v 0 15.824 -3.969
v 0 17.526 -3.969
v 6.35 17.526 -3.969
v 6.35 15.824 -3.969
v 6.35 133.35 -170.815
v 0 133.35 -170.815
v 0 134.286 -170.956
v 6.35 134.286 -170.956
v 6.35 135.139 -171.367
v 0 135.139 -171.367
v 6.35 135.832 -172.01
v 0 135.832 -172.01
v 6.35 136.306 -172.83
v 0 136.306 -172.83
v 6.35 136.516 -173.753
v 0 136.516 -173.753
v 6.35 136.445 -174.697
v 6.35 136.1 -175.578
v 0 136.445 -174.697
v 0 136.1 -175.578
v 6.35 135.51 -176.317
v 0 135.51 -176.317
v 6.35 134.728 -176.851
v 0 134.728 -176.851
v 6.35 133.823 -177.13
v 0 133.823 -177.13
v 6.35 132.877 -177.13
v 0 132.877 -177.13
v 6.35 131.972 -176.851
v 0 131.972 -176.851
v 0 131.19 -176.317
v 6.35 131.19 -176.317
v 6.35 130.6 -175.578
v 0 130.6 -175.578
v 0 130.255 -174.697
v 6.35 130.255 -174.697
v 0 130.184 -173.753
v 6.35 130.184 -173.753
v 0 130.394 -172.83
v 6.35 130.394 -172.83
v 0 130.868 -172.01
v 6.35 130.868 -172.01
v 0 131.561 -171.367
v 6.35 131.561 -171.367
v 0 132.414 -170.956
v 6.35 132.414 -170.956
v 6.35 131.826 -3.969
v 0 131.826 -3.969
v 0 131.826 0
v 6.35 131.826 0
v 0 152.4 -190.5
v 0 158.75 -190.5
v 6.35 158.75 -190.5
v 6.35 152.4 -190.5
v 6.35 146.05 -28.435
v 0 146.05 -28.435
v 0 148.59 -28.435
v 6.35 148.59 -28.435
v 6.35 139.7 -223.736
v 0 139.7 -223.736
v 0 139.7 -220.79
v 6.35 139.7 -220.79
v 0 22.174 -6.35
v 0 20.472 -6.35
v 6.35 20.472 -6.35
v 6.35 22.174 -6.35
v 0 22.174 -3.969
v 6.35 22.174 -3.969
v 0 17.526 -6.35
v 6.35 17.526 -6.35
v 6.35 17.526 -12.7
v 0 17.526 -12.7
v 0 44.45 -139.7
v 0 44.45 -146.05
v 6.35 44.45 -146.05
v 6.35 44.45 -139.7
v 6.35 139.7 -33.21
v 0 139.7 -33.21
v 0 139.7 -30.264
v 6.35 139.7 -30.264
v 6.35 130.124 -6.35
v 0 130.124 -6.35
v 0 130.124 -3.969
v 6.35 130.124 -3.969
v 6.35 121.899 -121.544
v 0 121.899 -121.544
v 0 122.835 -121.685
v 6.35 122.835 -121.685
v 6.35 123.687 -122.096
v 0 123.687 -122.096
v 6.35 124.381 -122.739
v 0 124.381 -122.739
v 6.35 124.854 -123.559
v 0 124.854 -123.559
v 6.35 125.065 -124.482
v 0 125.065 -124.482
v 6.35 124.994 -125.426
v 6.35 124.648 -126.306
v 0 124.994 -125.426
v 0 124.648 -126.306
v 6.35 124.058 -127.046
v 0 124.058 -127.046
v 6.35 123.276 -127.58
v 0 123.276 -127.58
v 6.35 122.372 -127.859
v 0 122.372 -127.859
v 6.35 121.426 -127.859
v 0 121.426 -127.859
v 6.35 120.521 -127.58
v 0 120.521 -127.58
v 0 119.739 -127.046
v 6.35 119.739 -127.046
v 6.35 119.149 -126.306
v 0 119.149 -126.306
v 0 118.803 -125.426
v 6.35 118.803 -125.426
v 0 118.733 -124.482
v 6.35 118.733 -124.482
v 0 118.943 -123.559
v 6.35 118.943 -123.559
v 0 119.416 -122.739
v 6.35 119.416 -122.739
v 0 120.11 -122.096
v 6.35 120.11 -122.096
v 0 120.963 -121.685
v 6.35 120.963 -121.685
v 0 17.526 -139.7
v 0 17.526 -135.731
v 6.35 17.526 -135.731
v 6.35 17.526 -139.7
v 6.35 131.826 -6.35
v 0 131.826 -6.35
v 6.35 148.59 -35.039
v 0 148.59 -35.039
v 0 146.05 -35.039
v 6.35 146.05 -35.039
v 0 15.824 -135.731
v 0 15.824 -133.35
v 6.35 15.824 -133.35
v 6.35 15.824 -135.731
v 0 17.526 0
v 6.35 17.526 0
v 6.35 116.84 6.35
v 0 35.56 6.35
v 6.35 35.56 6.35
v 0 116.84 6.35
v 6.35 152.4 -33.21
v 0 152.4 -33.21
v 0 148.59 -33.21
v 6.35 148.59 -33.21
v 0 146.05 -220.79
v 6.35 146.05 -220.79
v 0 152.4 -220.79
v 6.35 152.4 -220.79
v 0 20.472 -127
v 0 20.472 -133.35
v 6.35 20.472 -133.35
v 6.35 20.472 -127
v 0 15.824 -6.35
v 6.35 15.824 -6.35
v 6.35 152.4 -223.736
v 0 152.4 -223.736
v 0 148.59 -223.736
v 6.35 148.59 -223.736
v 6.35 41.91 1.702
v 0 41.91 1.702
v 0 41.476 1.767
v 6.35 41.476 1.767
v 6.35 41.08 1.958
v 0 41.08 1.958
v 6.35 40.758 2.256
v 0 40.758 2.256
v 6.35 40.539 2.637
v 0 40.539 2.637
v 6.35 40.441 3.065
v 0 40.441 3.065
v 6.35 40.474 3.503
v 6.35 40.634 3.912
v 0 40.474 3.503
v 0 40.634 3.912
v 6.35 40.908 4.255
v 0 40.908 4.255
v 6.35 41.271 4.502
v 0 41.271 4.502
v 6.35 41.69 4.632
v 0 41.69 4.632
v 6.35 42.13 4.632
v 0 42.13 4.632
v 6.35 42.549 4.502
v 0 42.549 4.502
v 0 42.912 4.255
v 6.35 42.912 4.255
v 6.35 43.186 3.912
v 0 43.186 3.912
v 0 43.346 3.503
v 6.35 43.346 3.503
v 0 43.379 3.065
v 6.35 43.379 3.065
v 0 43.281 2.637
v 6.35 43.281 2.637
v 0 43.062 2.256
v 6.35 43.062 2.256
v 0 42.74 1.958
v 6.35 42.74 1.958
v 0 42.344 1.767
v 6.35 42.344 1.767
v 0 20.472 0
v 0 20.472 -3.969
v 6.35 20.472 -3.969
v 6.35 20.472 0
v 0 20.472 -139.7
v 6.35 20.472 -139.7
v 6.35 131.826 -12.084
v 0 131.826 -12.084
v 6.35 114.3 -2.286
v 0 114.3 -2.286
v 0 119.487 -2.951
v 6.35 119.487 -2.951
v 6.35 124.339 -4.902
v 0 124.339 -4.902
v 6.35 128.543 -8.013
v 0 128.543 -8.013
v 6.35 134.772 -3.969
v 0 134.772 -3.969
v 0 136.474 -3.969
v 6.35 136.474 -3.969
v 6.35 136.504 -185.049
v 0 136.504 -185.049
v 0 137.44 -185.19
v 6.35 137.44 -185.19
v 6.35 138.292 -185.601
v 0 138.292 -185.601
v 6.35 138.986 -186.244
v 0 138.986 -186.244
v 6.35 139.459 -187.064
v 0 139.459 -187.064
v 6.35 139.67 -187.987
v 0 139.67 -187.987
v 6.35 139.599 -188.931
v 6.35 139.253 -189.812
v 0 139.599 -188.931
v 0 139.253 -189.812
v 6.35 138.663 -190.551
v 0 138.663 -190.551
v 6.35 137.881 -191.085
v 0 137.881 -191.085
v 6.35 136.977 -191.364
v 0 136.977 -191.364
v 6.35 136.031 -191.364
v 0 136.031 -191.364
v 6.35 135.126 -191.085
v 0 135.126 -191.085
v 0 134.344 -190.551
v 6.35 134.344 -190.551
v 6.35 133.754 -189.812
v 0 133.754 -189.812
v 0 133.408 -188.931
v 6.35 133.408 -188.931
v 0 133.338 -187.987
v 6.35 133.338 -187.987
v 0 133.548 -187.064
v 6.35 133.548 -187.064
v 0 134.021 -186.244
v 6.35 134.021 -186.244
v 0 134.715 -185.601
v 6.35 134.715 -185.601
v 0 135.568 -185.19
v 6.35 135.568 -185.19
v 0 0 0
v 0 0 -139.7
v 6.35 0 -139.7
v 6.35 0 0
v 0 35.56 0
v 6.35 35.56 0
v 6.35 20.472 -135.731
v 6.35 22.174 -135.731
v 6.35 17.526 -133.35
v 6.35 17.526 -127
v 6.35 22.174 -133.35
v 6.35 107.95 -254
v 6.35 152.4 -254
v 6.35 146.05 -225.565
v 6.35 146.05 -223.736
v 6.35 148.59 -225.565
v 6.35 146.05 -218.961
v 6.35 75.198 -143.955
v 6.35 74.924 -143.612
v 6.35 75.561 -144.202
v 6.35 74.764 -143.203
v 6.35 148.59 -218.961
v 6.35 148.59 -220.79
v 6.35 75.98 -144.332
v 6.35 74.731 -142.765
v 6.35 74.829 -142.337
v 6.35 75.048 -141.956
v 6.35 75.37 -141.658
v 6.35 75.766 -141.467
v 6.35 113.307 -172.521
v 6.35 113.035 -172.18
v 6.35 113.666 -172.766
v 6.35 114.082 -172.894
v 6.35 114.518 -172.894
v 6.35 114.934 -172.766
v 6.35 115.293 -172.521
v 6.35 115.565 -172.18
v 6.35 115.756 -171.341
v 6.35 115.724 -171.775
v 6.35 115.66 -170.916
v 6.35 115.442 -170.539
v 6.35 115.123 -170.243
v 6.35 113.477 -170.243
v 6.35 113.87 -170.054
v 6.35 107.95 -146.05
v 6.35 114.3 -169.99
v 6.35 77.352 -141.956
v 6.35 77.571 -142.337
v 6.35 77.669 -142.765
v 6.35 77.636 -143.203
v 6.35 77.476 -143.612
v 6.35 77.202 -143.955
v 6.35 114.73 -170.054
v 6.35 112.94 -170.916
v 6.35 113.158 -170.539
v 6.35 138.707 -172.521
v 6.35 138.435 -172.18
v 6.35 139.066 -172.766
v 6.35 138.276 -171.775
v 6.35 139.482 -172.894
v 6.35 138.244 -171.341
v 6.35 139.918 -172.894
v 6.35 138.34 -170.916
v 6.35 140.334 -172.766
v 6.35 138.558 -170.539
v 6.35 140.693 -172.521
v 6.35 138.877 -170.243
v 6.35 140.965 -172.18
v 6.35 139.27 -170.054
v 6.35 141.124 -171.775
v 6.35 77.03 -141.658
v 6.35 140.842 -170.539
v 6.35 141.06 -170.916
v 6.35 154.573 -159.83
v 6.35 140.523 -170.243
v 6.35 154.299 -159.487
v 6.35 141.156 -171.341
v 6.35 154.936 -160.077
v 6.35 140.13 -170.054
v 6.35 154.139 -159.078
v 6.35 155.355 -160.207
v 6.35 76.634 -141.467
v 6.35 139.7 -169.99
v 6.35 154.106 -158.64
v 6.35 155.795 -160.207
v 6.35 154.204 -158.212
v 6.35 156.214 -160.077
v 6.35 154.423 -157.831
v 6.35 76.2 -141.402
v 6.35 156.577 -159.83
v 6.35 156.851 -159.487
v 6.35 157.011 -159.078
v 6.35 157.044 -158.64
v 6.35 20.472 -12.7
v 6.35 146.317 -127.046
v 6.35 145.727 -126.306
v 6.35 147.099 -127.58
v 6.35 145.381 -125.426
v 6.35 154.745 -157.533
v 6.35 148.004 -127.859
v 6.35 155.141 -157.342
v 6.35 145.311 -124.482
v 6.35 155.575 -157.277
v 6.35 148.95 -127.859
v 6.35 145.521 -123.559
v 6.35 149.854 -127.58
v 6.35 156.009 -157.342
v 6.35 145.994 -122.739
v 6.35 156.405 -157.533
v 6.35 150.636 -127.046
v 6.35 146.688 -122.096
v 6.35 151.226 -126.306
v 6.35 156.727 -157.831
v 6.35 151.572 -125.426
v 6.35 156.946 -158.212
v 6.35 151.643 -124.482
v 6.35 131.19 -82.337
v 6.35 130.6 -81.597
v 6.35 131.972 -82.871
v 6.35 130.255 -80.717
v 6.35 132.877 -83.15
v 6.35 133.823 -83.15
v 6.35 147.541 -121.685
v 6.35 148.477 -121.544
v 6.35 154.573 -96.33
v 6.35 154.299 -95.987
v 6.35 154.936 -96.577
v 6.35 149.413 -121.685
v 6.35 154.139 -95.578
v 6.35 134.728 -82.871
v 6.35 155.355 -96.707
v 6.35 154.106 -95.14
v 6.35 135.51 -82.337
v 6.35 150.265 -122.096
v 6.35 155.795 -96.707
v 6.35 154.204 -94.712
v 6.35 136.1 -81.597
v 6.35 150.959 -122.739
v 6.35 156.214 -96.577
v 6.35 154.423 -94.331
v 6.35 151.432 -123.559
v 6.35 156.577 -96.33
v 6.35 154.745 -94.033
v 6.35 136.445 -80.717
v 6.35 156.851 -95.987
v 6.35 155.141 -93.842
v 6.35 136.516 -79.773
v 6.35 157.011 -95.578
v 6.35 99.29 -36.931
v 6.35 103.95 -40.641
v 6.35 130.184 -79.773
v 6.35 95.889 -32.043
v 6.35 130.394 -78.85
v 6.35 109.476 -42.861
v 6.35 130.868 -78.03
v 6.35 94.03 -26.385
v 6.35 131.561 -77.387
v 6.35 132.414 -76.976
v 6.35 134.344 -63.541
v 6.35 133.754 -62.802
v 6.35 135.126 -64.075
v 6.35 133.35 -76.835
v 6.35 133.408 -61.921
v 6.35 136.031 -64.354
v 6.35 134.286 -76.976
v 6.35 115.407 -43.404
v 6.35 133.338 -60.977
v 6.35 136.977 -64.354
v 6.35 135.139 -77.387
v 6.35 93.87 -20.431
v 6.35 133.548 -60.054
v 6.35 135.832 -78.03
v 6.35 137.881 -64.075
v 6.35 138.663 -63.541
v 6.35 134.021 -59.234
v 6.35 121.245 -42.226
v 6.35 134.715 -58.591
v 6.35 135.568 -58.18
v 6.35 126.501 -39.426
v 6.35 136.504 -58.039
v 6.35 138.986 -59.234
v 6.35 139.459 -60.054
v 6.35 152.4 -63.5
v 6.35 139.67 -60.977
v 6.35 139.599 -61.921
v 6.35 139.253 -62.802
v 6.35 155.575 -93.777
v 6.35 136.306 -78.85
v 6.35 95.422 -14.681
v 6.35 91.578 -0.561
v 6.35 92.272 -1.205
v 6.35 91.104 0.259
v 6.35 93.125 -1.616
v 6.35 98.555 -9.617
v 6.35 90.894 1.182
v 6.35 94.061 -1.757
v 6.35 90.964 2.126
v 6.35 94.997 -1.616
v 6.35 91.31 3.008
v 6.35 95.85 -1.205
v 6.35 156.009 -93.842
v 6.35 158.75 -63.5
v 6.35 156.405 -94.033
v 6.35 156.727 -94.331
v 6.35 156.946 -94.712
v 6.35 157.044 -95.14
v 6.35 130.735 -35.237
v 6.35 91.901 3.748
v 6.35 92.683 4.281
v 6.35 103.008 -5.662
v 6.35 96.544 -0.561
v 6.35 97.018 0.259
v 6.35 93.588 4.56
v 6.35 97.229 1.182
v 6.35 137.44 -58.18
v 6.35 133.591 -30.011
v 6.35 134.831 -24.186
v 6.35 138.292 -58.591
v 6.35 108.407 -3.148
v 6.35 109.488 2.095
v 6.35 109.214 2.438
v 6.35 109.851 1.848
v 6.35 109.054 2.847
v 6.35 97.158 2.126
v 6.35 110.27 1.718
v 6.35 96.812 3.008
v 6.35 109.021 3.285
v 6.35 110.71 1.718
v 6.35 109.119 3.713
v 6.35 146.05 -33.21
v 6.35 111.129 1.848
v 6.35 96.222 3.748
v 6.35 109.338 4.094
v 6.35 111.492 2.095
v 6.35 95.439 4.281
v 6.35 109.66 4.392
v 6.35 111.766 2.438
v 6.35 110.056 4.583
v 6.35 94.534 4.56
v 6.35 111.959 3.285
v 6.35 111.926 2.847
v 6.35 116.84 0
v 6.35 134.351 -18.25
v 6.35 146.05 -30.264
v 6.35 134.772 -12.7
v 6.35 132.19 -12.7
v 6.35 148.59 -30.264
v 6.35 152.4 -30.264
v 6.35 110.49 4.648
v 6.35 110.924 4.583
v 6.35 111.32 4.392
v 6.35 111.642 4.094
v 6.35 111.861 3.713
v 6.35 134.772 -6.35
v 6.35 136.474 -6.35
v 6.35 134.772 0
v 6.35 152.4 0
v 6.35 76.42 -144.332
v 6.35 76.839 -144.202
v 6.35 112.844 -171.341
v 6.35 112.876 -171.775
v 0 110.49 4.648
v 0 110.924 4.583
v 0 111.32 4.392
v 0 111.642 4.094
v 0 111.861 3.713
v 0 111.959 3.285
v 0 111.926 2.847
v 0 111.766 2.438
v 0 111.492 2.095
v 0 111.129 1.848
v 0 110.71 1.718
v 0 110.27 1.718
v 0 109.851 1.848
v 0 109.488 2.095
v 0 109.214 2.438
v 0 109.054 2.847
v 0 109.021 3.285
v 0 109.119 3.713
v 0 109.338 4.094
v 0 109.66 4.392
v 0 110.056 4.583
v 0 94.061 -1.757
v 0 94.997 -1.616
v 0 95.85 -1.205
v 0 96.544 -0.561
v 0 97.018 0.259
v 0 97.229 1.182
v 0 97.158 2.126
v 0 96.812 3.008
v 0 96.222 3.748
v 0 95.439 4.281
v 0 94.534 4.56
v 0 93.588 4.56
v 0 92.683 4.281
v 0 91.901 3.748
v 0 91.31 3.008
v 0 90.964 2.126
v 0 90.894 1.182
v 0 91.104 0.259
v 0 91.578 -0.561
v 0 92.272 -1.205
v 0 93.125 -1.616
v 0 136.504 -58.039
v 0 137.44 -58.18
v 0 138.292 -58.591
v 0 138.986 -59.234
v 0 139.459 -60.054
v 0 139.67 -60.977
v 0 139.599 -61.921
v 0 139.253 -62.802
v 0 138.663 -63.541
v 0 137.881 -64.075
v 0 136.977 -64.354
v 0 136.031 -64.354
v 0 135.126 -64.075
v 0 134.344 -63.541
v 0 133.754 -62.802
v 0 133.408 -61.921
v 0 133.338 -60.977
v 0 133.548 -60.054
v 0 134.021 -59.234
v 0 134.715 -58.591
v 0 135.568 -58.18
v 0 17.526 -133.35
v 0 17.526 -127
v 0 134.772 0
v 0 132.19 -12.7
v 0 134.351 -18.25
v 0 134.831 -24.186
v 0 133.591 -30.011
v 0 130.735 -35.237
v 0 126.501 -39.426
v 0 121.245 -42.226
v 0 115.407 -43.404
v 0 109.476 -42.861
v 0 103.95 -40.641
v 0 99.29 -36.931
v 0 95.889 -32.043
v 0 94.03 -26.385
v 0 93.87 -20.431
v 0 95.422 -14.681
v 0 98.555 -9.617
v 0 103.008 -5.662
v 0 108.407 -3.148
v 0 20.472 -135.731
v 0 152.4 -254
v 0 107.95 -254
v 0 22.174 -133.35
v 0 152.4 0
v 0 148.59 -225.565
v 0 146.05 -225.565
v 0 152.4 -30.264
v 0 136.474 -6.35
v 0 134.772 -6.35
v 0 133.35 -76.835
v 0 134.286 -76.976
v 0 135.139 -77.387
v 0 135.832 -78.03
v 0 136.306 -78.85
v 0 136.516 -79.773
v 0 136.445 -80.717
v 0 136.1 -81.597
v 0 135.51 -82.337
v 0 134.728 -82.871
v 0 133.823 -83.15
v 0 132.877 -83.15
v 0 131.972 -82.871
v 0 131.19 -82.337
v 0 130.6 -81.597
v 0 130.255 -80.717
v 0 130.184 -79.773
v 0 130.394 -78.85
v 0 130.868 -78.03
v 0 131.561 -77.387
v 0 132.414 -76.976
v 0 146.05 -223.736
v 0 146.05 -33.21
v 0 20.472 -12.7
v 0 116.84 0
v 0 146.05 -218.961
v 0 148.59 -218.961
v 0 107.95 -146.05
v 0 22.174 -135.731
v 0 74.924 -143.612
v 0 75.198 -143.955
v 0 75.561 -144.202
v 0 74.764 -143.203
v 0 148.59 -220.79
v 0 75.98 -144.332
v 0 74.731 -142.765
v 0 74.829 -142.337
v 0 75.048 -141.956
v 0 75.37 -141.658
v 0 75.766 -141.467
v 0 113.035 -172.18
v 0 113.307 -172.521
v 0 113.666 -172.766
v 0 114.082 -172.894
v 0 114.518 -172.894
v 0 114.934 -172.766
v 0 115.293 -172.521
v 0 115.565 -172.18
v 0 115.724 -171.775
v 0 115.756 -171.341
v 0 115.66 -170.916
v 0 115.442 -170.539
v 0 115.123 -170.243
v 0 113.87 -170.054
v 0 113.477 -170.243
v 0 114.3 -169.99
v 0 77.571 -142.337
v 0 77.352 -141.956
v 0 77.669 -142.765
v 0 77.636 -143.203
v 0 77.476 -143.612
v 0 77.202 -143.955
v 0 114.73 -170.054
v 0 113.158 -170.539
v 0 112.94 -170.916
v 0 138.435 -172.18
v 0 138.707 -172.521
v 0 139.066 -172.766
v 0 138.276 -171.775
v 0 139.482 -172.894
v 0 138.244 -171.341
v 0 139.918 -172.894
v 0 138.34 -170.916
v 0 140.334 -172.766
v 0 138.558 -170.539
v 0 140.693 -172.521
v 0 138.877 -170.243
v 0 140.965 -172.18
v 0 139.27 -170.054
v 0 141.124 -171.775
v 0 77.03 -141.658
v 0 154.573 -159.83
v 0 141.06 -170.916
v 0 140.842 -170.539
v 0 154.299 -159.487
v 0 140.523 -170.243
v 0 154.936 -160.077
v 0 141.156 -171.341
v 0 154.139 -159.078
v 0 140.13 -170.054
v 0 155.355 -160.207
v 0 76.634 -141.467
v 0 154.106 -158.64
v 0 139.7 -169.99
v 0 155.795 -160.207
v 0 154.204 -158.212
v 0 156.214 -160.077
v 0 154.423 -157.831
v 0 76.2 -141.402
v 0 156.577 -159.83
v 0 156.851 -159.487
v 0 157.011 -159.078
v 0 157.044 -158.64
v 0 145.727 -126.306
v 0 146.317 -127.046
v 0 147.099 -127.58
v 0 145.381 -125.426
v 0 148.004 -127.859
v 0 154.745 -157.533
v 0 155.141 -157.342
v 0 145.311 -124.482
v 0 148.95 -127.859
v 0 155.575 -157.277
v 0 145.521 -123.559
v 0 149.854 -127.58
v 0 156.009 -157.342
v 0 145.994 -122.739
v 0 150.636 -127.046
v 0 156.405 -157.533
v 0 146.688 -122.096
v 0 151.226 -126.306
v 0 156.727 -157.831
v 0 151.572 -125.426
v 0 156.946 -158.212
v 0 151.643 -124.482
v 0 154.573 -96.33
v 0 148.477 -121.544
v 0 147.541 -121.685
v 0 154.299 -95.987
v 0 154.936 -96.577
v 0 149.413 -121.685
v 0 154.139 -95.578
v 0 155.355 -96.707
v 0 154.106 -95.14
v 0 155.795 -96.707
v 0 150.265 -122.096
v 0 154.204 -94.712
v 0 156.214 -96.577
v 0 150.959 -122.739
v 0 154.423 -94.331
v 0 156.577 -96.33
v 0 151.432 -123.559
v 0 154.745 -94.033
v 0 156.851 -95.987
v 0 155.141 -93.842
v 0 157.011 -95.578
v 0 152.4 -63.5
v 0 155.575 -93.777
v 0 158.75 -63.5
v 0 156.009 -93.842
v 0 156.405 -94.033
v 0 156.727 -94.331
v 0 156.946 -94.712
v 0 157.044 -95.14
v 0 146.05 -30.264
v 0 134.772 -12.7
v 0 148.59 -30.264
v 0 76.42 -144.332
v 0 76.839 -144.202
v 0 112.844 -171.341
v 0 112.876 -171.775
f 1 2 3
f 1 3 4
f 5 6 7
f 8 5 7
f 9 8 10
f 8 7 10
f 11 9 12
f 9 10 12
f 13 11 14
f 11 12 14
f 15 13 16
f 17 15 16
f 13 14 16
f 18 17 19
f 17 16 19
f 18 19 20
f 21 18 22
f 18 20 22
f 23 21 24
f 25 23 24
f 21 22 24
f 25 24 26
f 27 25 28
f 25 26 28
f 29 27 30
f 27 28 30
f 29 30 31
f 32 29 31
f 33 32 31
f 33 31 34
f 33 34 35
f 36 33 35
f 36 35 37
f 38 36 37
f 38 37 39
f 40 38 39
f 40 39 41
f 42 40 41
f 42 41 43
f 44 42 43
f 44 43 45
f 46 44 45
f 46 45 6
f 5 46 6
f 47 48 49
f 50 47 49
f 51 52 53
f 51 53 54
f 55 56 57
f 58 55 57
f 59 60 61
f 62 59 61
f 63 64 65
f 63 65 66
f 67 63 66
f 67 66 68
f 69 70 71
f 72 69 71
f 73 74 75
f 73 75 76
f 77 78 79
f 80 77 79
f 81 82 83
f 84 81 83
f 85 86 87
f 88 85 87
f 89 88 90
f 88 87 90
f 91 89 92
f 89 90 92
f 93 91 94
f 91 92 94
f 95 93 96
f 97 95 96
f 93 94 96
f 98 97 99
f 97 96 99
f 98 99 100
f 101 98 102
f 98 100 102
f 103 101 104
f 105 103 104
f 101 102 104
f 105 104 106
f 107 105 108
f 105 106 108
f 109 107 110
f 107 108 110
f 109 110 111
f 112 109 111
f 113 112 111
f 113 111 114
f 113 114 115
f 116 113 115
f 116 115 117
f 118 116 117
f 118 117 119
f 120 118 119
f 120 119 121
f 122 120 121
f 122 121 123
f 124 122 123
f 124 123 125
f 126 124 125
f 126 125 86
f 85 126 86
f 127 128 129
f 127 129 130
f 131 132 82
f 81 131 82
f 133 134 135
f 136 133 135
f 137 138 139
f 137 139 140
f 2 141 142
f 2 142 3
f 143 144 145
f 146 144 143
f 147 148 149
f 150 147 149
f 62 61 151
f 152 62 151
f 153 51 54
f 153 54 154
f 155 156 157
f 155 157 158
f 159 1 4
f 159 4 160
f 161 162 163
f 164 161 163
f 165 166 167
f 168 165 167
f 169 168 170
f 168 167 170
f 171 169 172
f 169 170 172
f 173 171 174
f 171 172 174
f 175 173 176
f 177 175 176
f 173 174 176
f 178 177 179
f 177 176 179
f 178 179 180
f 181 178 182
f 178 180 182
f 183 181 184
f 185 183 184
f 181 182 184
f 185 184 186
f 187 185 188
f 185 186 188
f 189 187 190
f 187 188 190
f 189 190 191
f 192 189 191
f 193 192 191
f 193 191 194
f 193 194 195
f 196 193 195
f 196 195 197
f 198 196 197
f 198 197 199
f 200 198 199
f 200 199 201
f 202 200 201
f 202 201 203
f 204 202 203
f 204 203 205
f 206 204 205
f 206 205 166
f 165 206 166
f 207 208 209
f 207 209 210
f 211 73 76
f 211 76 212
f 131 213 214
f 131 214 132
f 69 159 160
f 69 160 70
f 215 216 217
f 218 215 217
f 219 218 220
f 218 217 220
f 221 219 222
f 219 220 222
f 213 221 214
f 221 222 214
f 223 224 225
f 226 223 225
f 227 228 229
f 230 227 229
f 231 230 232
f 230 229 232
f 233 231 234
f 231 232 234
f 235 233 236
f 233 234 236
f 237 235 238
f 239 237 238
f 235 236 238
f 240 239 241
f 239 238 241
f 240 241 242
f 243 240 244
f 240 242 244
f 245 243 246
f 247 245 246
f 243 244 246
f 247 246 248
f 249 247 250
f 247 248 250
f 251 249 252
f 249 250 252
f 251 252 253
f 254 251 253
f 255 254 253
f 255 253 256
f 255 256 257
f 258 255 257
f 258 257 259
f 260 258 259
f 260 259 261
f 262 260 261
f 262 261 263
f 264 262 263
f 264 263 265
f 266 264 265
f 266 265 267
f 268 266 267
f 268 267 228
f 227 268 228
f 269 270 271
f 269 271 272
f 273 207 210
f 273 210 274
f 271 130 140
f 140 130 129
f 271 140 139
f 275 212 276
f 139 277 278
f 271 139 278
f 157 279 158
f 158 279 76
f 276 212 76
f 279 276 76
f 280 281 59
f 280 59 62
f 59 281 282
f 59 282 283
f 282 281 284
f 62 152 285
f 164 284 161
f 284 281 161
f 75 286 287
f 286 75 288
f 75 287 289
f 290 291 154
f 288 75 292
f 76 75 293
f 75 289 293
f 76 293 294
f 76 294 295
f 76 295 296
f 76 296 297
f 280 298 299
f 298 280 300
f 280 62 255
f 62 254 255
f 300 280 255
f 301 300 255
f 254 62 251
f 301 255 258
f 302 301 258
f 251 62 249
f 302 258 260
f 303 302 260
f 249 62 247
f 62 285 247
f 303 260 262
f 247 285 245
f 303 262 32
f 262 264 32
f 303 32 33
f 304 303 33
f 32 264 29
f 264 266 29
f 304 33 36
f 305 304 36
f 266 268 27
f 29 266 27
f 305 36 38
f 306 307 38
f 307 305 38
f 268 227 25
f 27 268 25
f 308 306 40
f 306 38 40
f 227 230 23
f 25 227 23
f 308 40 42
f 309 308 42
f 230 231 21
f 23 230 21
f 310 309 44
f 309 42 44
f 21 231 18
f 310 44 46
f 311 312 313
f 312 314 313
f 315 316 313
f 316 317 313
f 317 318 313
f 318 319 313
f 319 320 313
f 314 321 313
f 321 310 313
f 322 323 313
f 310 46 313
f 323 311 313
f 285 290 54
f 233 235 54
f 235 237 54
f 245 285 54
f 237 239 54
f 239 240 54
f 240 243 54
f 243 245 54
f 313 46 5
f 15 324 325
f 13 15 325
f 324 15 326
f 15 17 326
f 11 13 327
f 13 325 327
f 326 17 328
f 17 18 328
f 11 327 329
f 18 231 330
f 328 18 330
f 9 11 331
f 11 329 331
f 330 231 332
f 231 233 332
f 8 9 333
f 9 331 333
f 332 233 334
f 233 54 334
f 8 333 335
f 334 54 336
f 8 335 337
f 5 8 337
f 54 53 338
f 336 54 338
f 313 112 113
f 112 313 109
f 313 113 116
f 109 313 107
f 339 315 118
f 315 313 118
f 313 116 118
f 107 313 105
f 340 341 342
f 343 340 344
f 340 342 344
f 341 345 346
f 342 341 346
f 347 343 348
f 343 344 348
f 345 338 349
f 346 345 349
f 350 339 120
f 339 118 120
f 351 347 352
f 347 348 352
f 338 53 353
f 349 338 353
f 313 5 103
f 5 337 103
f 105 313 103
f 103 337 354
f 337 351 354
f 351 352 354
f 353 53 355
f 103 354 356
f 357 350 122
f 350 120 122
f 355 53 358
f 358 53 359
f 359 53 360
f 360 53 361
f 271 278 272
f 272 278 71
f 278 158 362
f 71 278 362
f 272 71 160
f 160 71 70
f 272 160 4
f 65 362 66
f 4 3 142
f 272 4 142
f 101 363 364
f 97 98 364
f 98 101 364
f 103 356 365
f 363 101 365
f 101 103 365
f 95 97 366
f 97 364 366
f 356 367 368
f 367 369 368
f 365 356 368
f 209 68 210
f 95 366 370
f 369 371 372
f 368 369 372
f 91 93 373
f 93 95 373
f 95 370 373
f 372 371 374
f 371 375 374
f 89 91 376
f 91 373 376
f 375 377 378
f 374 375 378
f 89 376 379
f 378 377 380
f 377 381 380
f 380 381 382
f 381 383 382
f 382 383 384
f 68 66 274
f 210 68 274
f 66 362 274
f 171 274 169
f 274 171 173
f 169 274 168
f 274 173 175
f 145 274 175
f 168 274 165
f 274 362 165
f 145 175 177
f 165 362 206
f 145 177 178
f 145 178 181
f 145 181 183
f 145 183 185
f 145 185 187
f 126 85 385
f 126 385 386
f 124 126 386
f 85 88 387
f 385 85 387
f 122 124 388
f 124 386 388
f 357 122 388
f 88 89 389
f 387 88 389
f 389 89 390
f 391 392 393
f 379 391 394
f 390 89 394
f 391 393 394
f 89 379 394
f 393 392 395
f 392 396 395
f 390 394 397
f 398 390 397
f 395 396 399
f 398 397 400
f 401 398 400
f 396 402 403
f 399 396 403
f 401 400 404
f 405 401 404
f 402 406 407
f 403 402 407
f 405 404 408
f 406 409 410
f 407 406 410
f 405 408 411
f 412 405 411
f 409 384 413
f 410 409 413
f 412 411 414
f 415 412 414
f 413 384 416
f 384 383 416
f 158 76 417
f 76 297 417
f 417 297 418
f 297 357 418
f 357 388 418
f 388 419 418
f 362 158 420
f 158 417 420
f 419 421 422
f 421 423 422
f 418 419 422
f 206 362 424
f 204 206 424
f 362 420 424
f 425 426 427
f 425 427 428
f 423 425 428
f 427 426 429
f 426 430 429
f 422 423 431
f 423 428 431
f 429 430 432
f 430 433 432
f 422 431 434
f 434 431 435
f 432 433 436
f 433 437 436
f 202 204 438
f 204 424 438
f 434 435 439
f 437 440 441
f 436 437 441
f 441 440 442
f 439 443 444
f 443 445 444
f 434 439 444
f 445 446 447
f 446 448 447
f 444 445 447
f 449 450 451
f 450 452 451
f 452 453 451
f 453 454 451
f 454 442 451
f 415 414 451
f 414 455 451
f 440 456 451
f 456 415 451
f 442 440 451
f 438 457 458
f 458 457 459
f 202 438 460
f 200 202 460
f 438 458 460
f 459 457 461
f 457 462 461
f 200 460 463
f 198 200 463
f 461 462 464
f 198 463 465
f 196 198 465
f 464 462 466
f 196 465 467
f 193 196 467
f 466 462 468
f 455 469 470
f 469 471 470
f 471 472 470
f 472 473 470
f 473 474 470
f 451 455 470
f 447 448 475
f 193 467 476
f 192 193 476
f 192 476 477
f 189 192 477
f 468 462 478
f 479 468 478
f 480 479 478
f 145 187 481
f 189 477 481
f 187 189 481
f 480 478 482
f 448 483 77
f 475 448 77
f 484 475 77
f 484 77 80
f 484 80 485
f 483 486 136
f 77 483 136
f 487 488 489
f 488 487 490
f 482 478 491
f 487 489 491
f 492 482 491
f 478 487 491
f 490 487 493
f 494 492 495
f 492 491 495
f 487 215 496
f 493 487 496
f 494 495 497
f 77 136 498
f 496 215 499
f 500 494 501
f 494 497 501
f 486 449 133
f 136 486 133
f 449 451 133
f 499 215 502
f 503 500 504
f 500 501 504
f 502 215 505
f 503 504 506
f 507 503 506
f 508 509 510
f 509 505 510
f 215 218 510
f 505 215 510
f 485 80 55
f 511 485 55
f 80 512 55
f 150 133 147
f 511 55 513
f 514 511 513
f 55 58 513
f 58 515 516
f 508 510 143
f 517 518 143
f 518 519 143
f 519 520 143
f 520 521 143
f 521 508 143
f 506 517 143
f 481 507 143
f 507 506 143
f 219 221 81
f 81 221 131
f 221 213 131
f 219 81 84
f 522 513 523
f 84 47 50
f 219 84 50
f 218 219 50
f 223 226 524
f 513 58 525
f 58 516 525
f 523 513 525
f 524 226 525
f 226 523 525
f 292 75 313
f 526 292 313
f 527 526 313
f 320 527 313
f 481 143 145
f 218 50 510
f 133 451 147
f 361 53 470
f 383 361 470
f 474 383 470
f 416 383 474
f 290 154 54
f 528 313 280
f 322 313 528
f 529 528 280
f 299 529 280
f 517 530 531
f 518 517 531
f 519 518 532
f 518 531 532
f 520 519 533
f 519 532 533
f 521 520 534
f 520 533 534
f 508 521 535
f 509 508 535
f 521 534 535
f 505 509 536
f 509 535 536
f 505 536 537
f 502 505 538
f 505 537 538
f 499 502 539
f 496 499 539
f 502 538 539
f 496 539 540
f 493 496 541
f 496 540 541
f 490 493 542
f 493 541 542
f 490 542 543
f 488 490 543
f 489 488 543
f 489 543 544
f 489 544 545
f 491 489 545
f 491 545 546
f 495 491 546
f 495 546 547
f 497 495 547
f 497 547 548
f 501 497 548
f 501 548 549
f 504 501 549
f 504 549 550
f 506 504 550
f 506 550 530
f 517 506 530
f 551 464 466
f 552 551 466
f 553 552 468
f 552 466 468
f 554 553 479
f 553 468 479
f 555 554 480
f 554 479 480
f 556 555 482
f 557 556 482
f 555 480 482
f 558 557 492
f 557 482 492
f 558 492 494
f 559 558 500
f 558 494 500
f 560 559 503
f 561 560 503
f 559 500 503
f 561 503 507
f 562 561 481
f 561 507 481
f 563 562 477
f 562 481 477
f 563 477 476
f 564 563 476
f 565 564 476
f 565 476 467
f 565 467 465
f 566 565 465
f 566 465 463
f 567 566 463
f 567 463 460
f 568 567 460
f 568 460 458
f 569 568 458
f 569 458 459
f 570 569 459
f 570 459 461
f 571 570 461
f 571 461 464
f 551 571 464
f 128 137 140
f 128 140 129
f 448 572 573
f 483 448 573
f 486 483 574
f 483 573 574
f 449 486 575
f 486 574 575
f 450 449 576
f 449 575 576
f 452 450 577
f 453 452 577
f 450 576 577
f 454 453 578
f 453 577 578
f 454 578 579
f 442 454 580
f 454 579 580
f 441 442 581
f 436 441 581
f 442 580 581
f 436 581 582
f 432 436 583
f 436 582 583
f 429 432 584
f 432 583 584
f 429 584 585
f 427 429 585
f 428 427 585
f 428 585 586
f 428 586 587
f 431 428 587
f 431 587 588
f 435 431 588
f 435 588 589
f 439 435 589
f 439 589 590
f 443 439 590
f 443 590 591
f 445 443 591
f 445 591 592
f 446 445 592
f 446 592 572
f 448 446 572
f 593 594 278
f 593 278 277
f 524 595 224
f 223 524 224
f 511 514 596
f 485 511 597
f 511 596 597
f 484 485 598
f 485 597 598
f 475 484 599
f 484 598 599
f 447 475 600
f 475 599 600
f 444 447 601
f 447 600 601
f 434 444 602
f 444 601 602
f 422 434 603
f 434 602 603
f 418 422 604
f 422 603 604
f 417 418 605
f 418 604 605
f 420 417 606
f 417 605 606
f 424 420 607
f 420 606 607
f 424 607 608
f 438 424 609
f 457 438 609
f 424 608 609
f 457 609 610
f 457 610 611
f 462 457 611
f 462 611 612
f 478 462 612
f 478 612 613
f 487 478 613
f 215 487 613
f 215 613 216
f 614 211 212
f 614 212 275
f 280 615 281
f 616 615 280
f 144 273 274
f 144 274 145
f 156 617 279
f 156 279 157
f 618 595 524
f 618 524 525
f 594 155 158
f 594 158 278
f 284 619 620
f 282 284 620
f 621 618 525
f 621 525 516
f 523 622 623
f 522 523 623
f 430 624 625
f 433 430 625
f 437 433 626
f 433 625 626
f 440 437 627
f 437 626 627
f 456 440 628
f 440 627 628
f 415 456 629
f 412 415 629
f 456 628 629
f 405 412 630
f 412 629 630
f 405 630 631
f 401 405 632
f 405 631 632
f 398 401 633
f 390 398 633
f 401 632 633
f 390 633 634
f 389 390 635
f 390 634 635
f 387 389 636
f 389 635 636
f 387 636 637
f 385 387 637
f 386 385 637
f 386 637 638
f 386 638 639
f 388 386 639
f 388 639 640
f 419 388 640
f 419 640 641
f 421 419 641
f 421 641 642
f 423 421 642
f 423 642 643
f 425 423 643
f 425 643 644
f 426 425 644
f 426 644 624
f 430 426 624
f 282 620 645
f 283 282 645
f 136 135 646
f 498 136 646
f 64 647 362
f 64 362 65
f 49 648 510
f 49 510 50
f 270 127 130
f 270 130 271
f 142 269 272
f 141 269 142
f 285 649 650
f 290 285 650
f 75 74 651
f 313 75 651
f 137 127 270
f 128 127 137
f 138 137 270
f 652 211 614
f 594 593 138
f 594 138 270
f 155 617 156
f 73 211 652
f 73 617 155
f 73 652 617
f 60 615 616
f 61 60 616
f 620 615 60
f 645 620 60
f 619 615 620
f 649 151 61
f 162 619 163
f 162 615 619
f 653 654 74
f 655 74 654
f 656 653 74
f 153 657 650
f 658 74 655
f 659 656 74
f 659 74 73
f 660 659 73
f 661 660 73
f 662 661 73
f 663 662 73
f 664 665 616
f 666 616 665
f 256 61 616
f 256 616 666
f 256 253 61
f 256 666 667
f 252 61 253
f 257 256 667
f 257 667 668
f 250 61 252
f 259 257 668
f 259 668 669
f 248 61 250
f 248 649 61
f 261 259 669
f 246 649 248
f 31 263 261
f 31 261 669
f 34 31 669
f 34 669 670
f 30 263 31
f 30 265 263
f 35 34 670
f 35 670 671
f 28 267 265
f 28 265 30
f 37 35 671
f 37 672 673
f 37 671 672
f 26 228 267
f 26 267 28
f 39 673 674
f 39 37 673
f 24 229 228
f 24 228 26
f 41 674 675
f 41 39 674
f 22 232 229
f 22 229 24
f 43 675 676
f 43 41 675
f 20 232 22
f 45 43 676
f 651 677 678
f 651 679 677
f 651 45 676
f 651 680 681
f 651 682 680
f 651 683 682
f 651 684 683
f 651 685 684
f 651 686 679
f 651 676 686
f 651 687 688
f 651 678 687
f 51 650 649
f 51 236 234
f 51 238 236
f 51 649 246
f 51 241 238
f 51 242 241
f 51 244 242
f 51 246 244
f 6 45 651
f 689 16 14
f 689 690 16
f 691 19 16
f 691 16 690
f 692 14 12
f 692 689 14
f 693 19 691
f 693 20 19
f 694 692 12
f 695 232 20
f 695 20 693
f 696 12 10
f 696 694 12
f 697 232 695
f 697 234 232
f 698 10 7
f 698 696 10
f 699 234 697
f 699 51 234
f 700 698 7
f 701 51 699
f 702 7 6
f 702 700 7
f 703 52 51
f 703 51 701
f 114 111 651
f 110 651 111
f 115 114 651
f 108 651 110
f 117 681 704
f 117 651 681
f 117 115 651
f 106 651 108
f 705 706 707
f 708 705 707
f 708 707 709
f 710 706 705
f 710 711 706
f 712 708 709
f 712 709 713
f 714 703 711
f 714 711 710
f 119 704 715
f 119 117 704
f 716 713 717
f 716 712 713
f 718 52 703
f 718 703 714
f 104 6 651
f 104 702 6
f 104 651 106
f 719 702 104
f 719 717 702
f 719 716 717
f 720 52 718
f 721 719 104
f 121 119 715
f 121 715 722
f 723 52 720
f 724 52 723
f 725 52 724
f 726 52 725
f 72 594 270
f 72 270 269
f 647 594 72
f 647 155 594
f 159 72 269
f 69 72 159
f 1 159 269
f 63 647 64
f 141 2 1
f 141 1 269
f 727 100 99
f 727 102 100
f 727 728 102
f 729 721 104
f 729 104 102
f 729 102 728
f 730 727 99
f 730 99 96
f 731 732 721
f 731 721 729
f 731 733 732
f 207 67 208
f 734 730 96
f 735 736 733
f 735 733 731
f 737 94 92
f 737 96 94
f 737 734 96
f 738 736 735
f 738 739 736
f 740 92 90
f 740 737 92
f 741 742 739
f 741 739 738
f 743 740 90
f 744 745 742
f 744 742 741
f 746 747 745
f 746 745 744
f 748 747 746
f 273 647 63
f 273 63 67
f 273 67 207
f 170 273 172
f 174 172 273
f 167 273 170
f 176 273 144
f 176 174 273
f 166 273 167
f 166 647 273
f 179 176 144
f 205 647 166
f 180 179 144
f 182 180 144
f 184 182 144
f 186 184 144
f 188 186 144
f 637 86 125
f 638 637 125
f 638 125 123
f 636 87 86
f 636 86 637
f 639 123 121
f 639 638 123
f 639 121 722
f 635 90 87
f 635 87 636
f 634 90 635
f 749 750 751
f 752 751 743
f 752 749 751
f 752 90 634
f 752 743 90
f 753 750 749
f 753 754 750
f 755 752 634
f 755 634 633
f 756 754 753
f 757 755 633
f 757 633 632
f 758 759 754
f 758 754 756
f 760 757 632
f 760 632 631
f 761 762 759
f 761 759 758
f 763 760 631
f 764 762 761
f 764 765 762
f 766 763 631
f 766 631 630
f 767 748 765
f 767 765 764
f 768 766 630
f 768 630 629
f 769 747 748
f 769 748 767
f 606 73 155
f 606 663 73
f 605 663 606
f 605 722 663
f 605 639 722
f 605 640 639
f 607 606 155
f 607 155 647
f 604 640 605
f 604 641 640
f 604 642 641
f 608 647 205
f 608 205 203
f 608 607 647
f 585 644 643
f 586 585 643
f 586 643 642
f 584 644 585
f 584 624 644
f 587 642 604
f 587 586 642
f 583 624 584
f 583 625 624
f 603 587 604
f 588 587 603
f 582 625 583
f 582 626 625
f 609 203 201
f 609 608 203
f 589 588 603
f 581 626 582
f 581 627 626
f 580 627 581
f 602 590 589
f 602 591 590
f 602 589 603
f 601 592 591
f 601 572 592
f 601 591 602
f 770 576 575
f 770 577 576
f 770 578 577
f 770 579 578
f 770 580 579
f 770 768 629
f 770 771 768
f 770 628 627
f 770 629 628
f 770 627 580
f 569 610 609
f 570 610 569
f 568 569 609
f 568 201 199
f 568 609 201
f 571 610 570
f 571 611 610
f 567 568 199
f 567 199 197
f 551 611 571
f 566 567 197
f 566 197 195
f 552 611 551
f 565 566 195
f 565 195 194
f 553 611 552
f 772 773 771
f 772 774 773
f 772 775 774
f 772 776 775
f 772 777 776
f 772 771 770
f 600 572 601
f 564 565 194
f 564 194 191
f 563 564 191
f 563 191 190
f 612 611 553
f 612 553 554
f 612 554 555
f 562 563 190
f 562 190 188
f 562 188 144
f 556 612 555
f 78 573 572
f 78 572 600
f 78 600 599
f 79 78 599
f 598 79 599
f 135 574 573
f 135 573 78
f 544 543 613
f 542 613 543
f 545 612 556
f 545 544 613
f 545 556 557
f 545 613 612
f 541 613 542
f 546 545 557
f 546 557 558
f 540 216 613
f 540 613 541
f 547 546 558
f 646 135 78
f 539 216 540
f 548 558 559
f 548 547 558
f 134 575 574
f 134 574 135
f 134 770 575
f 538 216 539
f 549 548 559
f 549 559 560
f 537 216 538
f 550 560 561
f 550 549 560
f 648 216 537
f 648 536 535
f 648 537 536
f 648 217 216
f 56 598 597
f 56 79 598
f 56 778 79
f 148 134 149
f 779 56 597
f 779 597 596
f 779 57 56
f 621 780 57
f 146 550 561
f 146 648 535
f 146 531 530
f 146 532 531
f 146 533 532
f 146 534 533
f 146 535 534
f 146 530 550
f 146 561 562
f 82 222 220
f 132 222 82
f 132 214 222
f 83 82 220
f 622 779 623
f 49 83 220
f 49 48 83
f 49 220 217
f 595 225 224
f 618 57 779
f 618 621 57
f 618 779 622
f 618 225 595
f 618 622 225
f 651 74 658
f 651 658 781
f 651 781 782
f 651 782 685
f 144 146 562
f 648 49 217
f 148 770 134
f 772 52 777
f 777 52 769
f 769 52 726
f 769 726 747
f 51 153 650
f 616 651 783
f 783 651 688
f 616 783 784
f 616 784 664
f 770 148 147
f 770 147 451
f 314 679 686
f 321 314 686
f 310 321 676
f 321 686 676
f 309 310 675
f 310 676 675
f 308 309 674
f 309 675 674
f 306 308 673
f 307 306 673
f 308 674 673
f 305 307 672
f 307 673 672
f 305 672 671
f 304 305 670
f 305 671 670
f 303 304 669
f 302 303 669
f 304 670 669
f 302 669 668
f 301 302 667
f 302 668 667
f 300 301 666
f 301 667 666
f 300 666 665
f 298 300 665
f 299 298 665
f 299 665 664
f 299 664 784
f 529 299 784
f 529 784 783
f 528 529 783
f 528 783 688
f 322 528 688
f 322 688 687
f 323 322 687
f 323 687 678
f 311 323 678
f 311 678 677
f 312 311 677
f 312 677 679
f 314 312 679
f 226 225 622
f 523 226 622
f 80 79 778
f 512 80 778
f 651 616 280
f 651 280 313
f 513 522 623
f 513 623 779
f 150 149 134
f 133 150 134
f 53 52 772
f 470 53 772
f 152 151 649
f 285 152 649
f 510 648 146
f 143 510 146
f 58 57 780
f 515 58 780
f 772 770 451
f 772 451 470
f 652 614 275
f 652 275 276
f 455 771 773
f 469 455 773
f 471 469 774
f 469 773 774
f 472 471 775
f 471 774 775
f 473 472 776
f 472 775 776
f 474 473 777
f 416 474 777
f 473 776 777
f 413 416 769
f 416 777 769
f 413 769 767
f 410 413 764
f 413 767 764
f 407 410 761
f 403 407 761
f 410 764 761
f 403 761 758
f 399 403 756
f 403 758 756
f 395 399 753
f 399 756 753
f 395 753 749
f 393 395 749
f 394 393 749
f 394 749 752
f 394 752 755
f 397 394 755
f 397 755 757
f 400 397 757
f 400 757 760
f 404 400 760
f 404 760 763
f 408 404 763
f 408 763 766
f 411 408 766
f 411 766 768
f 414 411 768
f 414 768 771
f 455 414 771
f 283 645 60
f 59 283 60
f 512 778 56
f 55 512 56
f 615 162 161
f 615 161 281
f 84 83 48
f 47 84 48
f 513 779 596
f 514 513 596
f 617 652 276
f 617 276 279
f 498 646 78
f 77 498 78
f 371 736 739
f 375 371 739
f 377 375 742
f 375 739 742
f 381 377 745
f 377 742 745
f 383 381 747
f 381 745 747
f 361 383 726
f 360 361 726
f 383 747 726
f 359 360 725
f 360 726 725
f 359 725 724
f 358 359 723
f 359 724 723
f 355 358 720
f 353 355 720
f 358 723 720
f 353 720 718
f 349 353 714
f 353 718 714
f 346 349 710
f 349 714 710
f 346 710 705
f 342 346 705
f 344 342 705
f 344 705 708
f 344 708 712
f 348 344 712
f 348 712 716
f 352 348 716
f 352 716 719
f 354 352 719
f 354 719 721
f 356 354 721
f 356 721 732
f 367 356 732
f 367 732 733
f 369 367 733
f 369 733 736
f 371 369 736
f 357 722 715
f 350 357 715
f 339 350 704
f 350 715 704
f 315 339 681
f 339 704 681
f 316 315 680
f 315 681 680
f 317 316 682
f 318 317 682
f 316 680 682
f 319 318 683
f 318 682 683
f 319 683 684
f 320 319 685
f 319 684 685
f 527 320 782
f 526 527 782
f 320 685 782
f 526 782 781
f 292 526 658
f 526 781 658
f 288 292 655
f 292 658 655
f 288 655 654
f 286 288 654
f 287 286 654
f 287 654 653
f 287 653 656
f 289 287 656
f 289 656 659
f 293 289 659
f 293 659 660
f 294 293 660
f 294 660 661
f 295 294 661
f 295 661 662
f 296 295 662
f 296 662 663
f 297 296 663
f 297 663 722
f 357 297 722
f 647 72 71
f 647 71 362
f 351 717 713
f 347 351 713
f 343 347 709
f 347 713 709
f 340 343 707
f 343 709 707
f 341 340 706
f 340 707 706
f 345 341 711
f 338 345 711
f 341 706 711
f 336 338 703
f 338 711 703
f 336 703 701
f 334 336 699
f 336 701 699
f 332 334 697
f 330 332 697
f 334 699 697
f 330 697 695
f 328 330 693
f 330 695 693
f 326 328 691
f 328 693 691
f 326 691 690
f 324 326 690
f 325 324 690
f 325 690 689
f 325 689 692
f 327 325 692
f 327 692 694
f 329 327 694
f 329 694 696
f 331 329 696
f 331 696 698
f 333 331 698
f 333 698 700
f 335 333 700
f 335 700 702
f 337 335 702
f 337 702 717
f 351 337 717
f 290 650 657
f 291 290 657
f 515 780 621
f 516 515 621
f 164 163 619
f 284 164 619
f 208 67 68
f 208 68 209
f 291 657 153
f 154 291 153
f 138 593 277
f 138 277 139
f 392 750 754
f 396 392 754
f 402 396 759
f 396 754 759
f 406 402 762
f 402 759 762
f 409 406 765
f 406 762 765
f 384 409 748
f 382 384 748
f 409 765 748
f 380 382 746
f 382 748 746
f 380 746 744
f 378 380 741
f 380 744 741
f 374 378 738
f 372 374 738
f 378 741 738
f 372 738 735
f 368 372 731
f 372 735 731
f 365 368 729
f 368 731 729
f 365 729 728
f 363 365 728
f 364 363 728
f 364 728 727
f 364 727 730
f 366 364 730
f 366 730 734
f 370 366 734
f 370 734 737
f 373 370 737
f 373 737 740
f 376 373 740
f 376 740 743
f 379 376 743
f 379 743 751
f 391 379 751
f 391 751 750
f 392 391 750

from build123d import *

# Parameters (mm, degrees)
BOSS_EXTRUDE1_DEPTH = 6.35
CUT_EXTRUDE1_DEPTH  = 300.596203247
SKETCH4_W           = 6.35
SKETCH4_H           = 81.28
SKETCH4_H_2         = 63.5
BOSS_EXTRUDE3_DEPTH = 6.35
SKETCH5_R           = 1.4732
CUT_EXTRUDE2_DEPTH  = 300.596203247
SKETCH6_R           = 3.175
SKETCH6_R_2         = 3.174999999
SKETCH6_R_3         = 1.4732
CUT_EXTRUDE3_DEPTH  = 300.596203247
CUT_EXTRUDE4_REACH  = 301.596
SKETCH7_R           = 3.1763843
SKETCH8_R           = 1.4605
CUT_EXTRUDE5_DEPTH  = 300.596203247
SKETCH11_R          = 20.574
CUT_EXTRUDE6_DEPTH  = 25.4


with BuildPart() as part:
    # Sketch1 → Boss-Extrude1 (new body)
    with BuildSketch(Plane(origin=(0, 0, 0), x_dir=(0, 0, -1), z_dir=(1, 0, 0))):
        Polygon((63.5, 158.75), (139.7, 158.75), (190.5, 158.75), (190.5, 152.4), (254, 152.4), (254, 107.95), (139.7, 107.95), (139.7, 0), (0, 0), (0, 152.4), (63.5, 152.4), align=None)
    extrude(amount=BOSS_EXTRUDE1_DEPTH)

    # Sketch2 → Cut-Extrude1 (cut, through all)
    with BuildSketch(Plane.ZY):
        Polygon((0, 17.526), (-3.96875, 17.526), (-3.96875, 15.8242), (-6.35, 15.8242), (-6.35, 17.526), (-12.7, 17.526), (-12.7, 20.4724), (-6.35, 20.4724), (-6.35, 22.1742), (-3.96875, 22.1742), (-3.96875, 20.4724), (0, 20.4724), align=None)
        Polygon((-139.7, 17.526), (-139.7, 20.4724), (-135.73125, 20.4724), (-135.73125, 22.1742), (-133.35, 22.1742), (-133.35, 20.4724), (-127, 20.4724), (-127, 17.526), (-133.35, 17.526), (-133.35, 15.8242), (-135.73125, 15.8242), (-135.73125, 17.526), align=None)
        Polygon((-12.7, 134.7724), (-12.7, 131.826), (-6.35, 131.826), (-6.35, 130.1242), (-3.96875, 130.1242), (-3.96875, 131.826), (0, 131.826), (0, 134.7724), (-3.96875, 134.7724), (-3.96875, 136.4742), (-6.35, 136.4742), (-6.35, 134.7724), align=None)
    extrude(amount=-CUT_EXTRUDE1_DEPTH, mode=Mode.SUBTRACT)

    # Sketch4 → Boss-Extrude3 (add)
    with BuildSketch(Plane.ZY):
        with Locations((3.175, 76.2)):
            Rectangle(SKETCH4_W, SKETCH4_H)
        with Locations((-142.875, 76.2)):
            Rectangle(SKETCH4_W, SKETCH4_H_2)
    extrude(amount=-BOSS_EXTRUDE3_DEPTH)

    # Sketch5 → Cut-Extrude2 (cut, through all)
    with BuildSketch(Plane.ZY):
        with Locations(Location((3.175, 41.91, 0), (0, 0, 180))):
            Circle(SKETCH5_R)
        with Locations((-142.875, 76.2)):
            Circle(SKETCH5_R)
        with Locations((3.175, 110.49)):
            Circle(SKETCH5_R)
    extrude(amount=-CUT_EXTRUDE2_DEPTH, mode=Mode.SUBTRACT)

    # Sketch6 → Cut-Extrude3 (cut, through all)
    with BuildSketch(Plane.ZY):
        with Locations((-61.214, 136.503809763)):
            Circle(SKETCH6_R)
        with Locations((-80.009999999, 133.35)):
            Circle(SKETCH6_R_2)
        with Locations((-95.25, 155.575)):
            Circle(SKETCH6_R_3)
        with Locations((-158.75, 155.575)):
            Circle(SKETCH6_R_3)
        with Locations((-188.224, 136.50380976)):
            Circle(SKETCH6_R)
        with Locations((-173.99, 133.35)):
            Circle(SKETCH6_R)
        with Locations((-124.719, 148.476804798)):
            Circle(SKETCH6_R)
        with Locations((-124.719, 121.898809762)):
            Circle(SKETCH6_R)
        Polygon((-30.2641, 152.4), (-33.2105, 152.4), (-33.2105, 148.59), (-35.0393, 148.59), (-35.0393, 146.05), (-33.2105, 146.05), (-33.2105, 139.7), (-30.2641, 139.7), (-30.2641, 146.05), (-28.4353, 146.05), (-28.4353, 148.59), (-30.2641, 148.59), align=None)
        Polygon((-220.7895, 152.4), (-223.7359, 152.4), (-223.7359, 148.59), (-225.5647, 148.59), (-225.5647, 146.05), (-223.7359, 146.05), (-223.7359, 139.7), (-220.7895, 139.7), (-220.7895, 146.05), (-218.9607, 146.05), (-218.9607, 148.59), (-220.7895, 148.59), align=None)
    extrude(amount=-CUT_EXTRUDE3_DEPTH, mode=Mode.SUBTRACT)

    # Sketch7 → Cut-Extrude4 (cut, up to next)
    with BuildSketch(Plane(origin=(6.35, 0, 0), x_dir=(0, 0, -1), z_dir=(1, 0, 0)), mode=Mode.PRIVATE) as cut_extrude4_sk1:
        with Locations((-1.419543332, 94.061078275)):
            Circle(SKETCH7_R)
    cut_extrude4_tool1 = extrude(cut_extrude4_sk1.sketch, amount=-CUT_EXTRUDE4_REACH, mode=Mode.PRIVATE) & part.part
    add(cut_extrude4_tool1.solids().sort_by_distance((6.35, 94.061078, 1.419543))[0], mode=Mode.SUBTRACT)

    # Sketch8 → Cut-Extrude5 (cut, through all)
    with BuildSketch(Plane.ZY):
        with Locations((-171.45, 114.3)):
            Circle(SKETCH8_R)
        with Locations((-171.45, 139.7)):
            Circle(SKETCH8_R)
    extrude(amount=-CUT_EXTRUDE5_DEPTH, mode=Mode.SUBTRACT)

    # Sketch11 → Cut-Extrude6 (cut)
    with BuildSketch(Plane.ZY):
        with Locations((-22.86, 114.3)):
            Circle(SKETCH11_R)
    extrude(amount=-CUT_EXTRUDE6_DEPTH, mode=Mode.SUBTRACT)


solid = part.part
